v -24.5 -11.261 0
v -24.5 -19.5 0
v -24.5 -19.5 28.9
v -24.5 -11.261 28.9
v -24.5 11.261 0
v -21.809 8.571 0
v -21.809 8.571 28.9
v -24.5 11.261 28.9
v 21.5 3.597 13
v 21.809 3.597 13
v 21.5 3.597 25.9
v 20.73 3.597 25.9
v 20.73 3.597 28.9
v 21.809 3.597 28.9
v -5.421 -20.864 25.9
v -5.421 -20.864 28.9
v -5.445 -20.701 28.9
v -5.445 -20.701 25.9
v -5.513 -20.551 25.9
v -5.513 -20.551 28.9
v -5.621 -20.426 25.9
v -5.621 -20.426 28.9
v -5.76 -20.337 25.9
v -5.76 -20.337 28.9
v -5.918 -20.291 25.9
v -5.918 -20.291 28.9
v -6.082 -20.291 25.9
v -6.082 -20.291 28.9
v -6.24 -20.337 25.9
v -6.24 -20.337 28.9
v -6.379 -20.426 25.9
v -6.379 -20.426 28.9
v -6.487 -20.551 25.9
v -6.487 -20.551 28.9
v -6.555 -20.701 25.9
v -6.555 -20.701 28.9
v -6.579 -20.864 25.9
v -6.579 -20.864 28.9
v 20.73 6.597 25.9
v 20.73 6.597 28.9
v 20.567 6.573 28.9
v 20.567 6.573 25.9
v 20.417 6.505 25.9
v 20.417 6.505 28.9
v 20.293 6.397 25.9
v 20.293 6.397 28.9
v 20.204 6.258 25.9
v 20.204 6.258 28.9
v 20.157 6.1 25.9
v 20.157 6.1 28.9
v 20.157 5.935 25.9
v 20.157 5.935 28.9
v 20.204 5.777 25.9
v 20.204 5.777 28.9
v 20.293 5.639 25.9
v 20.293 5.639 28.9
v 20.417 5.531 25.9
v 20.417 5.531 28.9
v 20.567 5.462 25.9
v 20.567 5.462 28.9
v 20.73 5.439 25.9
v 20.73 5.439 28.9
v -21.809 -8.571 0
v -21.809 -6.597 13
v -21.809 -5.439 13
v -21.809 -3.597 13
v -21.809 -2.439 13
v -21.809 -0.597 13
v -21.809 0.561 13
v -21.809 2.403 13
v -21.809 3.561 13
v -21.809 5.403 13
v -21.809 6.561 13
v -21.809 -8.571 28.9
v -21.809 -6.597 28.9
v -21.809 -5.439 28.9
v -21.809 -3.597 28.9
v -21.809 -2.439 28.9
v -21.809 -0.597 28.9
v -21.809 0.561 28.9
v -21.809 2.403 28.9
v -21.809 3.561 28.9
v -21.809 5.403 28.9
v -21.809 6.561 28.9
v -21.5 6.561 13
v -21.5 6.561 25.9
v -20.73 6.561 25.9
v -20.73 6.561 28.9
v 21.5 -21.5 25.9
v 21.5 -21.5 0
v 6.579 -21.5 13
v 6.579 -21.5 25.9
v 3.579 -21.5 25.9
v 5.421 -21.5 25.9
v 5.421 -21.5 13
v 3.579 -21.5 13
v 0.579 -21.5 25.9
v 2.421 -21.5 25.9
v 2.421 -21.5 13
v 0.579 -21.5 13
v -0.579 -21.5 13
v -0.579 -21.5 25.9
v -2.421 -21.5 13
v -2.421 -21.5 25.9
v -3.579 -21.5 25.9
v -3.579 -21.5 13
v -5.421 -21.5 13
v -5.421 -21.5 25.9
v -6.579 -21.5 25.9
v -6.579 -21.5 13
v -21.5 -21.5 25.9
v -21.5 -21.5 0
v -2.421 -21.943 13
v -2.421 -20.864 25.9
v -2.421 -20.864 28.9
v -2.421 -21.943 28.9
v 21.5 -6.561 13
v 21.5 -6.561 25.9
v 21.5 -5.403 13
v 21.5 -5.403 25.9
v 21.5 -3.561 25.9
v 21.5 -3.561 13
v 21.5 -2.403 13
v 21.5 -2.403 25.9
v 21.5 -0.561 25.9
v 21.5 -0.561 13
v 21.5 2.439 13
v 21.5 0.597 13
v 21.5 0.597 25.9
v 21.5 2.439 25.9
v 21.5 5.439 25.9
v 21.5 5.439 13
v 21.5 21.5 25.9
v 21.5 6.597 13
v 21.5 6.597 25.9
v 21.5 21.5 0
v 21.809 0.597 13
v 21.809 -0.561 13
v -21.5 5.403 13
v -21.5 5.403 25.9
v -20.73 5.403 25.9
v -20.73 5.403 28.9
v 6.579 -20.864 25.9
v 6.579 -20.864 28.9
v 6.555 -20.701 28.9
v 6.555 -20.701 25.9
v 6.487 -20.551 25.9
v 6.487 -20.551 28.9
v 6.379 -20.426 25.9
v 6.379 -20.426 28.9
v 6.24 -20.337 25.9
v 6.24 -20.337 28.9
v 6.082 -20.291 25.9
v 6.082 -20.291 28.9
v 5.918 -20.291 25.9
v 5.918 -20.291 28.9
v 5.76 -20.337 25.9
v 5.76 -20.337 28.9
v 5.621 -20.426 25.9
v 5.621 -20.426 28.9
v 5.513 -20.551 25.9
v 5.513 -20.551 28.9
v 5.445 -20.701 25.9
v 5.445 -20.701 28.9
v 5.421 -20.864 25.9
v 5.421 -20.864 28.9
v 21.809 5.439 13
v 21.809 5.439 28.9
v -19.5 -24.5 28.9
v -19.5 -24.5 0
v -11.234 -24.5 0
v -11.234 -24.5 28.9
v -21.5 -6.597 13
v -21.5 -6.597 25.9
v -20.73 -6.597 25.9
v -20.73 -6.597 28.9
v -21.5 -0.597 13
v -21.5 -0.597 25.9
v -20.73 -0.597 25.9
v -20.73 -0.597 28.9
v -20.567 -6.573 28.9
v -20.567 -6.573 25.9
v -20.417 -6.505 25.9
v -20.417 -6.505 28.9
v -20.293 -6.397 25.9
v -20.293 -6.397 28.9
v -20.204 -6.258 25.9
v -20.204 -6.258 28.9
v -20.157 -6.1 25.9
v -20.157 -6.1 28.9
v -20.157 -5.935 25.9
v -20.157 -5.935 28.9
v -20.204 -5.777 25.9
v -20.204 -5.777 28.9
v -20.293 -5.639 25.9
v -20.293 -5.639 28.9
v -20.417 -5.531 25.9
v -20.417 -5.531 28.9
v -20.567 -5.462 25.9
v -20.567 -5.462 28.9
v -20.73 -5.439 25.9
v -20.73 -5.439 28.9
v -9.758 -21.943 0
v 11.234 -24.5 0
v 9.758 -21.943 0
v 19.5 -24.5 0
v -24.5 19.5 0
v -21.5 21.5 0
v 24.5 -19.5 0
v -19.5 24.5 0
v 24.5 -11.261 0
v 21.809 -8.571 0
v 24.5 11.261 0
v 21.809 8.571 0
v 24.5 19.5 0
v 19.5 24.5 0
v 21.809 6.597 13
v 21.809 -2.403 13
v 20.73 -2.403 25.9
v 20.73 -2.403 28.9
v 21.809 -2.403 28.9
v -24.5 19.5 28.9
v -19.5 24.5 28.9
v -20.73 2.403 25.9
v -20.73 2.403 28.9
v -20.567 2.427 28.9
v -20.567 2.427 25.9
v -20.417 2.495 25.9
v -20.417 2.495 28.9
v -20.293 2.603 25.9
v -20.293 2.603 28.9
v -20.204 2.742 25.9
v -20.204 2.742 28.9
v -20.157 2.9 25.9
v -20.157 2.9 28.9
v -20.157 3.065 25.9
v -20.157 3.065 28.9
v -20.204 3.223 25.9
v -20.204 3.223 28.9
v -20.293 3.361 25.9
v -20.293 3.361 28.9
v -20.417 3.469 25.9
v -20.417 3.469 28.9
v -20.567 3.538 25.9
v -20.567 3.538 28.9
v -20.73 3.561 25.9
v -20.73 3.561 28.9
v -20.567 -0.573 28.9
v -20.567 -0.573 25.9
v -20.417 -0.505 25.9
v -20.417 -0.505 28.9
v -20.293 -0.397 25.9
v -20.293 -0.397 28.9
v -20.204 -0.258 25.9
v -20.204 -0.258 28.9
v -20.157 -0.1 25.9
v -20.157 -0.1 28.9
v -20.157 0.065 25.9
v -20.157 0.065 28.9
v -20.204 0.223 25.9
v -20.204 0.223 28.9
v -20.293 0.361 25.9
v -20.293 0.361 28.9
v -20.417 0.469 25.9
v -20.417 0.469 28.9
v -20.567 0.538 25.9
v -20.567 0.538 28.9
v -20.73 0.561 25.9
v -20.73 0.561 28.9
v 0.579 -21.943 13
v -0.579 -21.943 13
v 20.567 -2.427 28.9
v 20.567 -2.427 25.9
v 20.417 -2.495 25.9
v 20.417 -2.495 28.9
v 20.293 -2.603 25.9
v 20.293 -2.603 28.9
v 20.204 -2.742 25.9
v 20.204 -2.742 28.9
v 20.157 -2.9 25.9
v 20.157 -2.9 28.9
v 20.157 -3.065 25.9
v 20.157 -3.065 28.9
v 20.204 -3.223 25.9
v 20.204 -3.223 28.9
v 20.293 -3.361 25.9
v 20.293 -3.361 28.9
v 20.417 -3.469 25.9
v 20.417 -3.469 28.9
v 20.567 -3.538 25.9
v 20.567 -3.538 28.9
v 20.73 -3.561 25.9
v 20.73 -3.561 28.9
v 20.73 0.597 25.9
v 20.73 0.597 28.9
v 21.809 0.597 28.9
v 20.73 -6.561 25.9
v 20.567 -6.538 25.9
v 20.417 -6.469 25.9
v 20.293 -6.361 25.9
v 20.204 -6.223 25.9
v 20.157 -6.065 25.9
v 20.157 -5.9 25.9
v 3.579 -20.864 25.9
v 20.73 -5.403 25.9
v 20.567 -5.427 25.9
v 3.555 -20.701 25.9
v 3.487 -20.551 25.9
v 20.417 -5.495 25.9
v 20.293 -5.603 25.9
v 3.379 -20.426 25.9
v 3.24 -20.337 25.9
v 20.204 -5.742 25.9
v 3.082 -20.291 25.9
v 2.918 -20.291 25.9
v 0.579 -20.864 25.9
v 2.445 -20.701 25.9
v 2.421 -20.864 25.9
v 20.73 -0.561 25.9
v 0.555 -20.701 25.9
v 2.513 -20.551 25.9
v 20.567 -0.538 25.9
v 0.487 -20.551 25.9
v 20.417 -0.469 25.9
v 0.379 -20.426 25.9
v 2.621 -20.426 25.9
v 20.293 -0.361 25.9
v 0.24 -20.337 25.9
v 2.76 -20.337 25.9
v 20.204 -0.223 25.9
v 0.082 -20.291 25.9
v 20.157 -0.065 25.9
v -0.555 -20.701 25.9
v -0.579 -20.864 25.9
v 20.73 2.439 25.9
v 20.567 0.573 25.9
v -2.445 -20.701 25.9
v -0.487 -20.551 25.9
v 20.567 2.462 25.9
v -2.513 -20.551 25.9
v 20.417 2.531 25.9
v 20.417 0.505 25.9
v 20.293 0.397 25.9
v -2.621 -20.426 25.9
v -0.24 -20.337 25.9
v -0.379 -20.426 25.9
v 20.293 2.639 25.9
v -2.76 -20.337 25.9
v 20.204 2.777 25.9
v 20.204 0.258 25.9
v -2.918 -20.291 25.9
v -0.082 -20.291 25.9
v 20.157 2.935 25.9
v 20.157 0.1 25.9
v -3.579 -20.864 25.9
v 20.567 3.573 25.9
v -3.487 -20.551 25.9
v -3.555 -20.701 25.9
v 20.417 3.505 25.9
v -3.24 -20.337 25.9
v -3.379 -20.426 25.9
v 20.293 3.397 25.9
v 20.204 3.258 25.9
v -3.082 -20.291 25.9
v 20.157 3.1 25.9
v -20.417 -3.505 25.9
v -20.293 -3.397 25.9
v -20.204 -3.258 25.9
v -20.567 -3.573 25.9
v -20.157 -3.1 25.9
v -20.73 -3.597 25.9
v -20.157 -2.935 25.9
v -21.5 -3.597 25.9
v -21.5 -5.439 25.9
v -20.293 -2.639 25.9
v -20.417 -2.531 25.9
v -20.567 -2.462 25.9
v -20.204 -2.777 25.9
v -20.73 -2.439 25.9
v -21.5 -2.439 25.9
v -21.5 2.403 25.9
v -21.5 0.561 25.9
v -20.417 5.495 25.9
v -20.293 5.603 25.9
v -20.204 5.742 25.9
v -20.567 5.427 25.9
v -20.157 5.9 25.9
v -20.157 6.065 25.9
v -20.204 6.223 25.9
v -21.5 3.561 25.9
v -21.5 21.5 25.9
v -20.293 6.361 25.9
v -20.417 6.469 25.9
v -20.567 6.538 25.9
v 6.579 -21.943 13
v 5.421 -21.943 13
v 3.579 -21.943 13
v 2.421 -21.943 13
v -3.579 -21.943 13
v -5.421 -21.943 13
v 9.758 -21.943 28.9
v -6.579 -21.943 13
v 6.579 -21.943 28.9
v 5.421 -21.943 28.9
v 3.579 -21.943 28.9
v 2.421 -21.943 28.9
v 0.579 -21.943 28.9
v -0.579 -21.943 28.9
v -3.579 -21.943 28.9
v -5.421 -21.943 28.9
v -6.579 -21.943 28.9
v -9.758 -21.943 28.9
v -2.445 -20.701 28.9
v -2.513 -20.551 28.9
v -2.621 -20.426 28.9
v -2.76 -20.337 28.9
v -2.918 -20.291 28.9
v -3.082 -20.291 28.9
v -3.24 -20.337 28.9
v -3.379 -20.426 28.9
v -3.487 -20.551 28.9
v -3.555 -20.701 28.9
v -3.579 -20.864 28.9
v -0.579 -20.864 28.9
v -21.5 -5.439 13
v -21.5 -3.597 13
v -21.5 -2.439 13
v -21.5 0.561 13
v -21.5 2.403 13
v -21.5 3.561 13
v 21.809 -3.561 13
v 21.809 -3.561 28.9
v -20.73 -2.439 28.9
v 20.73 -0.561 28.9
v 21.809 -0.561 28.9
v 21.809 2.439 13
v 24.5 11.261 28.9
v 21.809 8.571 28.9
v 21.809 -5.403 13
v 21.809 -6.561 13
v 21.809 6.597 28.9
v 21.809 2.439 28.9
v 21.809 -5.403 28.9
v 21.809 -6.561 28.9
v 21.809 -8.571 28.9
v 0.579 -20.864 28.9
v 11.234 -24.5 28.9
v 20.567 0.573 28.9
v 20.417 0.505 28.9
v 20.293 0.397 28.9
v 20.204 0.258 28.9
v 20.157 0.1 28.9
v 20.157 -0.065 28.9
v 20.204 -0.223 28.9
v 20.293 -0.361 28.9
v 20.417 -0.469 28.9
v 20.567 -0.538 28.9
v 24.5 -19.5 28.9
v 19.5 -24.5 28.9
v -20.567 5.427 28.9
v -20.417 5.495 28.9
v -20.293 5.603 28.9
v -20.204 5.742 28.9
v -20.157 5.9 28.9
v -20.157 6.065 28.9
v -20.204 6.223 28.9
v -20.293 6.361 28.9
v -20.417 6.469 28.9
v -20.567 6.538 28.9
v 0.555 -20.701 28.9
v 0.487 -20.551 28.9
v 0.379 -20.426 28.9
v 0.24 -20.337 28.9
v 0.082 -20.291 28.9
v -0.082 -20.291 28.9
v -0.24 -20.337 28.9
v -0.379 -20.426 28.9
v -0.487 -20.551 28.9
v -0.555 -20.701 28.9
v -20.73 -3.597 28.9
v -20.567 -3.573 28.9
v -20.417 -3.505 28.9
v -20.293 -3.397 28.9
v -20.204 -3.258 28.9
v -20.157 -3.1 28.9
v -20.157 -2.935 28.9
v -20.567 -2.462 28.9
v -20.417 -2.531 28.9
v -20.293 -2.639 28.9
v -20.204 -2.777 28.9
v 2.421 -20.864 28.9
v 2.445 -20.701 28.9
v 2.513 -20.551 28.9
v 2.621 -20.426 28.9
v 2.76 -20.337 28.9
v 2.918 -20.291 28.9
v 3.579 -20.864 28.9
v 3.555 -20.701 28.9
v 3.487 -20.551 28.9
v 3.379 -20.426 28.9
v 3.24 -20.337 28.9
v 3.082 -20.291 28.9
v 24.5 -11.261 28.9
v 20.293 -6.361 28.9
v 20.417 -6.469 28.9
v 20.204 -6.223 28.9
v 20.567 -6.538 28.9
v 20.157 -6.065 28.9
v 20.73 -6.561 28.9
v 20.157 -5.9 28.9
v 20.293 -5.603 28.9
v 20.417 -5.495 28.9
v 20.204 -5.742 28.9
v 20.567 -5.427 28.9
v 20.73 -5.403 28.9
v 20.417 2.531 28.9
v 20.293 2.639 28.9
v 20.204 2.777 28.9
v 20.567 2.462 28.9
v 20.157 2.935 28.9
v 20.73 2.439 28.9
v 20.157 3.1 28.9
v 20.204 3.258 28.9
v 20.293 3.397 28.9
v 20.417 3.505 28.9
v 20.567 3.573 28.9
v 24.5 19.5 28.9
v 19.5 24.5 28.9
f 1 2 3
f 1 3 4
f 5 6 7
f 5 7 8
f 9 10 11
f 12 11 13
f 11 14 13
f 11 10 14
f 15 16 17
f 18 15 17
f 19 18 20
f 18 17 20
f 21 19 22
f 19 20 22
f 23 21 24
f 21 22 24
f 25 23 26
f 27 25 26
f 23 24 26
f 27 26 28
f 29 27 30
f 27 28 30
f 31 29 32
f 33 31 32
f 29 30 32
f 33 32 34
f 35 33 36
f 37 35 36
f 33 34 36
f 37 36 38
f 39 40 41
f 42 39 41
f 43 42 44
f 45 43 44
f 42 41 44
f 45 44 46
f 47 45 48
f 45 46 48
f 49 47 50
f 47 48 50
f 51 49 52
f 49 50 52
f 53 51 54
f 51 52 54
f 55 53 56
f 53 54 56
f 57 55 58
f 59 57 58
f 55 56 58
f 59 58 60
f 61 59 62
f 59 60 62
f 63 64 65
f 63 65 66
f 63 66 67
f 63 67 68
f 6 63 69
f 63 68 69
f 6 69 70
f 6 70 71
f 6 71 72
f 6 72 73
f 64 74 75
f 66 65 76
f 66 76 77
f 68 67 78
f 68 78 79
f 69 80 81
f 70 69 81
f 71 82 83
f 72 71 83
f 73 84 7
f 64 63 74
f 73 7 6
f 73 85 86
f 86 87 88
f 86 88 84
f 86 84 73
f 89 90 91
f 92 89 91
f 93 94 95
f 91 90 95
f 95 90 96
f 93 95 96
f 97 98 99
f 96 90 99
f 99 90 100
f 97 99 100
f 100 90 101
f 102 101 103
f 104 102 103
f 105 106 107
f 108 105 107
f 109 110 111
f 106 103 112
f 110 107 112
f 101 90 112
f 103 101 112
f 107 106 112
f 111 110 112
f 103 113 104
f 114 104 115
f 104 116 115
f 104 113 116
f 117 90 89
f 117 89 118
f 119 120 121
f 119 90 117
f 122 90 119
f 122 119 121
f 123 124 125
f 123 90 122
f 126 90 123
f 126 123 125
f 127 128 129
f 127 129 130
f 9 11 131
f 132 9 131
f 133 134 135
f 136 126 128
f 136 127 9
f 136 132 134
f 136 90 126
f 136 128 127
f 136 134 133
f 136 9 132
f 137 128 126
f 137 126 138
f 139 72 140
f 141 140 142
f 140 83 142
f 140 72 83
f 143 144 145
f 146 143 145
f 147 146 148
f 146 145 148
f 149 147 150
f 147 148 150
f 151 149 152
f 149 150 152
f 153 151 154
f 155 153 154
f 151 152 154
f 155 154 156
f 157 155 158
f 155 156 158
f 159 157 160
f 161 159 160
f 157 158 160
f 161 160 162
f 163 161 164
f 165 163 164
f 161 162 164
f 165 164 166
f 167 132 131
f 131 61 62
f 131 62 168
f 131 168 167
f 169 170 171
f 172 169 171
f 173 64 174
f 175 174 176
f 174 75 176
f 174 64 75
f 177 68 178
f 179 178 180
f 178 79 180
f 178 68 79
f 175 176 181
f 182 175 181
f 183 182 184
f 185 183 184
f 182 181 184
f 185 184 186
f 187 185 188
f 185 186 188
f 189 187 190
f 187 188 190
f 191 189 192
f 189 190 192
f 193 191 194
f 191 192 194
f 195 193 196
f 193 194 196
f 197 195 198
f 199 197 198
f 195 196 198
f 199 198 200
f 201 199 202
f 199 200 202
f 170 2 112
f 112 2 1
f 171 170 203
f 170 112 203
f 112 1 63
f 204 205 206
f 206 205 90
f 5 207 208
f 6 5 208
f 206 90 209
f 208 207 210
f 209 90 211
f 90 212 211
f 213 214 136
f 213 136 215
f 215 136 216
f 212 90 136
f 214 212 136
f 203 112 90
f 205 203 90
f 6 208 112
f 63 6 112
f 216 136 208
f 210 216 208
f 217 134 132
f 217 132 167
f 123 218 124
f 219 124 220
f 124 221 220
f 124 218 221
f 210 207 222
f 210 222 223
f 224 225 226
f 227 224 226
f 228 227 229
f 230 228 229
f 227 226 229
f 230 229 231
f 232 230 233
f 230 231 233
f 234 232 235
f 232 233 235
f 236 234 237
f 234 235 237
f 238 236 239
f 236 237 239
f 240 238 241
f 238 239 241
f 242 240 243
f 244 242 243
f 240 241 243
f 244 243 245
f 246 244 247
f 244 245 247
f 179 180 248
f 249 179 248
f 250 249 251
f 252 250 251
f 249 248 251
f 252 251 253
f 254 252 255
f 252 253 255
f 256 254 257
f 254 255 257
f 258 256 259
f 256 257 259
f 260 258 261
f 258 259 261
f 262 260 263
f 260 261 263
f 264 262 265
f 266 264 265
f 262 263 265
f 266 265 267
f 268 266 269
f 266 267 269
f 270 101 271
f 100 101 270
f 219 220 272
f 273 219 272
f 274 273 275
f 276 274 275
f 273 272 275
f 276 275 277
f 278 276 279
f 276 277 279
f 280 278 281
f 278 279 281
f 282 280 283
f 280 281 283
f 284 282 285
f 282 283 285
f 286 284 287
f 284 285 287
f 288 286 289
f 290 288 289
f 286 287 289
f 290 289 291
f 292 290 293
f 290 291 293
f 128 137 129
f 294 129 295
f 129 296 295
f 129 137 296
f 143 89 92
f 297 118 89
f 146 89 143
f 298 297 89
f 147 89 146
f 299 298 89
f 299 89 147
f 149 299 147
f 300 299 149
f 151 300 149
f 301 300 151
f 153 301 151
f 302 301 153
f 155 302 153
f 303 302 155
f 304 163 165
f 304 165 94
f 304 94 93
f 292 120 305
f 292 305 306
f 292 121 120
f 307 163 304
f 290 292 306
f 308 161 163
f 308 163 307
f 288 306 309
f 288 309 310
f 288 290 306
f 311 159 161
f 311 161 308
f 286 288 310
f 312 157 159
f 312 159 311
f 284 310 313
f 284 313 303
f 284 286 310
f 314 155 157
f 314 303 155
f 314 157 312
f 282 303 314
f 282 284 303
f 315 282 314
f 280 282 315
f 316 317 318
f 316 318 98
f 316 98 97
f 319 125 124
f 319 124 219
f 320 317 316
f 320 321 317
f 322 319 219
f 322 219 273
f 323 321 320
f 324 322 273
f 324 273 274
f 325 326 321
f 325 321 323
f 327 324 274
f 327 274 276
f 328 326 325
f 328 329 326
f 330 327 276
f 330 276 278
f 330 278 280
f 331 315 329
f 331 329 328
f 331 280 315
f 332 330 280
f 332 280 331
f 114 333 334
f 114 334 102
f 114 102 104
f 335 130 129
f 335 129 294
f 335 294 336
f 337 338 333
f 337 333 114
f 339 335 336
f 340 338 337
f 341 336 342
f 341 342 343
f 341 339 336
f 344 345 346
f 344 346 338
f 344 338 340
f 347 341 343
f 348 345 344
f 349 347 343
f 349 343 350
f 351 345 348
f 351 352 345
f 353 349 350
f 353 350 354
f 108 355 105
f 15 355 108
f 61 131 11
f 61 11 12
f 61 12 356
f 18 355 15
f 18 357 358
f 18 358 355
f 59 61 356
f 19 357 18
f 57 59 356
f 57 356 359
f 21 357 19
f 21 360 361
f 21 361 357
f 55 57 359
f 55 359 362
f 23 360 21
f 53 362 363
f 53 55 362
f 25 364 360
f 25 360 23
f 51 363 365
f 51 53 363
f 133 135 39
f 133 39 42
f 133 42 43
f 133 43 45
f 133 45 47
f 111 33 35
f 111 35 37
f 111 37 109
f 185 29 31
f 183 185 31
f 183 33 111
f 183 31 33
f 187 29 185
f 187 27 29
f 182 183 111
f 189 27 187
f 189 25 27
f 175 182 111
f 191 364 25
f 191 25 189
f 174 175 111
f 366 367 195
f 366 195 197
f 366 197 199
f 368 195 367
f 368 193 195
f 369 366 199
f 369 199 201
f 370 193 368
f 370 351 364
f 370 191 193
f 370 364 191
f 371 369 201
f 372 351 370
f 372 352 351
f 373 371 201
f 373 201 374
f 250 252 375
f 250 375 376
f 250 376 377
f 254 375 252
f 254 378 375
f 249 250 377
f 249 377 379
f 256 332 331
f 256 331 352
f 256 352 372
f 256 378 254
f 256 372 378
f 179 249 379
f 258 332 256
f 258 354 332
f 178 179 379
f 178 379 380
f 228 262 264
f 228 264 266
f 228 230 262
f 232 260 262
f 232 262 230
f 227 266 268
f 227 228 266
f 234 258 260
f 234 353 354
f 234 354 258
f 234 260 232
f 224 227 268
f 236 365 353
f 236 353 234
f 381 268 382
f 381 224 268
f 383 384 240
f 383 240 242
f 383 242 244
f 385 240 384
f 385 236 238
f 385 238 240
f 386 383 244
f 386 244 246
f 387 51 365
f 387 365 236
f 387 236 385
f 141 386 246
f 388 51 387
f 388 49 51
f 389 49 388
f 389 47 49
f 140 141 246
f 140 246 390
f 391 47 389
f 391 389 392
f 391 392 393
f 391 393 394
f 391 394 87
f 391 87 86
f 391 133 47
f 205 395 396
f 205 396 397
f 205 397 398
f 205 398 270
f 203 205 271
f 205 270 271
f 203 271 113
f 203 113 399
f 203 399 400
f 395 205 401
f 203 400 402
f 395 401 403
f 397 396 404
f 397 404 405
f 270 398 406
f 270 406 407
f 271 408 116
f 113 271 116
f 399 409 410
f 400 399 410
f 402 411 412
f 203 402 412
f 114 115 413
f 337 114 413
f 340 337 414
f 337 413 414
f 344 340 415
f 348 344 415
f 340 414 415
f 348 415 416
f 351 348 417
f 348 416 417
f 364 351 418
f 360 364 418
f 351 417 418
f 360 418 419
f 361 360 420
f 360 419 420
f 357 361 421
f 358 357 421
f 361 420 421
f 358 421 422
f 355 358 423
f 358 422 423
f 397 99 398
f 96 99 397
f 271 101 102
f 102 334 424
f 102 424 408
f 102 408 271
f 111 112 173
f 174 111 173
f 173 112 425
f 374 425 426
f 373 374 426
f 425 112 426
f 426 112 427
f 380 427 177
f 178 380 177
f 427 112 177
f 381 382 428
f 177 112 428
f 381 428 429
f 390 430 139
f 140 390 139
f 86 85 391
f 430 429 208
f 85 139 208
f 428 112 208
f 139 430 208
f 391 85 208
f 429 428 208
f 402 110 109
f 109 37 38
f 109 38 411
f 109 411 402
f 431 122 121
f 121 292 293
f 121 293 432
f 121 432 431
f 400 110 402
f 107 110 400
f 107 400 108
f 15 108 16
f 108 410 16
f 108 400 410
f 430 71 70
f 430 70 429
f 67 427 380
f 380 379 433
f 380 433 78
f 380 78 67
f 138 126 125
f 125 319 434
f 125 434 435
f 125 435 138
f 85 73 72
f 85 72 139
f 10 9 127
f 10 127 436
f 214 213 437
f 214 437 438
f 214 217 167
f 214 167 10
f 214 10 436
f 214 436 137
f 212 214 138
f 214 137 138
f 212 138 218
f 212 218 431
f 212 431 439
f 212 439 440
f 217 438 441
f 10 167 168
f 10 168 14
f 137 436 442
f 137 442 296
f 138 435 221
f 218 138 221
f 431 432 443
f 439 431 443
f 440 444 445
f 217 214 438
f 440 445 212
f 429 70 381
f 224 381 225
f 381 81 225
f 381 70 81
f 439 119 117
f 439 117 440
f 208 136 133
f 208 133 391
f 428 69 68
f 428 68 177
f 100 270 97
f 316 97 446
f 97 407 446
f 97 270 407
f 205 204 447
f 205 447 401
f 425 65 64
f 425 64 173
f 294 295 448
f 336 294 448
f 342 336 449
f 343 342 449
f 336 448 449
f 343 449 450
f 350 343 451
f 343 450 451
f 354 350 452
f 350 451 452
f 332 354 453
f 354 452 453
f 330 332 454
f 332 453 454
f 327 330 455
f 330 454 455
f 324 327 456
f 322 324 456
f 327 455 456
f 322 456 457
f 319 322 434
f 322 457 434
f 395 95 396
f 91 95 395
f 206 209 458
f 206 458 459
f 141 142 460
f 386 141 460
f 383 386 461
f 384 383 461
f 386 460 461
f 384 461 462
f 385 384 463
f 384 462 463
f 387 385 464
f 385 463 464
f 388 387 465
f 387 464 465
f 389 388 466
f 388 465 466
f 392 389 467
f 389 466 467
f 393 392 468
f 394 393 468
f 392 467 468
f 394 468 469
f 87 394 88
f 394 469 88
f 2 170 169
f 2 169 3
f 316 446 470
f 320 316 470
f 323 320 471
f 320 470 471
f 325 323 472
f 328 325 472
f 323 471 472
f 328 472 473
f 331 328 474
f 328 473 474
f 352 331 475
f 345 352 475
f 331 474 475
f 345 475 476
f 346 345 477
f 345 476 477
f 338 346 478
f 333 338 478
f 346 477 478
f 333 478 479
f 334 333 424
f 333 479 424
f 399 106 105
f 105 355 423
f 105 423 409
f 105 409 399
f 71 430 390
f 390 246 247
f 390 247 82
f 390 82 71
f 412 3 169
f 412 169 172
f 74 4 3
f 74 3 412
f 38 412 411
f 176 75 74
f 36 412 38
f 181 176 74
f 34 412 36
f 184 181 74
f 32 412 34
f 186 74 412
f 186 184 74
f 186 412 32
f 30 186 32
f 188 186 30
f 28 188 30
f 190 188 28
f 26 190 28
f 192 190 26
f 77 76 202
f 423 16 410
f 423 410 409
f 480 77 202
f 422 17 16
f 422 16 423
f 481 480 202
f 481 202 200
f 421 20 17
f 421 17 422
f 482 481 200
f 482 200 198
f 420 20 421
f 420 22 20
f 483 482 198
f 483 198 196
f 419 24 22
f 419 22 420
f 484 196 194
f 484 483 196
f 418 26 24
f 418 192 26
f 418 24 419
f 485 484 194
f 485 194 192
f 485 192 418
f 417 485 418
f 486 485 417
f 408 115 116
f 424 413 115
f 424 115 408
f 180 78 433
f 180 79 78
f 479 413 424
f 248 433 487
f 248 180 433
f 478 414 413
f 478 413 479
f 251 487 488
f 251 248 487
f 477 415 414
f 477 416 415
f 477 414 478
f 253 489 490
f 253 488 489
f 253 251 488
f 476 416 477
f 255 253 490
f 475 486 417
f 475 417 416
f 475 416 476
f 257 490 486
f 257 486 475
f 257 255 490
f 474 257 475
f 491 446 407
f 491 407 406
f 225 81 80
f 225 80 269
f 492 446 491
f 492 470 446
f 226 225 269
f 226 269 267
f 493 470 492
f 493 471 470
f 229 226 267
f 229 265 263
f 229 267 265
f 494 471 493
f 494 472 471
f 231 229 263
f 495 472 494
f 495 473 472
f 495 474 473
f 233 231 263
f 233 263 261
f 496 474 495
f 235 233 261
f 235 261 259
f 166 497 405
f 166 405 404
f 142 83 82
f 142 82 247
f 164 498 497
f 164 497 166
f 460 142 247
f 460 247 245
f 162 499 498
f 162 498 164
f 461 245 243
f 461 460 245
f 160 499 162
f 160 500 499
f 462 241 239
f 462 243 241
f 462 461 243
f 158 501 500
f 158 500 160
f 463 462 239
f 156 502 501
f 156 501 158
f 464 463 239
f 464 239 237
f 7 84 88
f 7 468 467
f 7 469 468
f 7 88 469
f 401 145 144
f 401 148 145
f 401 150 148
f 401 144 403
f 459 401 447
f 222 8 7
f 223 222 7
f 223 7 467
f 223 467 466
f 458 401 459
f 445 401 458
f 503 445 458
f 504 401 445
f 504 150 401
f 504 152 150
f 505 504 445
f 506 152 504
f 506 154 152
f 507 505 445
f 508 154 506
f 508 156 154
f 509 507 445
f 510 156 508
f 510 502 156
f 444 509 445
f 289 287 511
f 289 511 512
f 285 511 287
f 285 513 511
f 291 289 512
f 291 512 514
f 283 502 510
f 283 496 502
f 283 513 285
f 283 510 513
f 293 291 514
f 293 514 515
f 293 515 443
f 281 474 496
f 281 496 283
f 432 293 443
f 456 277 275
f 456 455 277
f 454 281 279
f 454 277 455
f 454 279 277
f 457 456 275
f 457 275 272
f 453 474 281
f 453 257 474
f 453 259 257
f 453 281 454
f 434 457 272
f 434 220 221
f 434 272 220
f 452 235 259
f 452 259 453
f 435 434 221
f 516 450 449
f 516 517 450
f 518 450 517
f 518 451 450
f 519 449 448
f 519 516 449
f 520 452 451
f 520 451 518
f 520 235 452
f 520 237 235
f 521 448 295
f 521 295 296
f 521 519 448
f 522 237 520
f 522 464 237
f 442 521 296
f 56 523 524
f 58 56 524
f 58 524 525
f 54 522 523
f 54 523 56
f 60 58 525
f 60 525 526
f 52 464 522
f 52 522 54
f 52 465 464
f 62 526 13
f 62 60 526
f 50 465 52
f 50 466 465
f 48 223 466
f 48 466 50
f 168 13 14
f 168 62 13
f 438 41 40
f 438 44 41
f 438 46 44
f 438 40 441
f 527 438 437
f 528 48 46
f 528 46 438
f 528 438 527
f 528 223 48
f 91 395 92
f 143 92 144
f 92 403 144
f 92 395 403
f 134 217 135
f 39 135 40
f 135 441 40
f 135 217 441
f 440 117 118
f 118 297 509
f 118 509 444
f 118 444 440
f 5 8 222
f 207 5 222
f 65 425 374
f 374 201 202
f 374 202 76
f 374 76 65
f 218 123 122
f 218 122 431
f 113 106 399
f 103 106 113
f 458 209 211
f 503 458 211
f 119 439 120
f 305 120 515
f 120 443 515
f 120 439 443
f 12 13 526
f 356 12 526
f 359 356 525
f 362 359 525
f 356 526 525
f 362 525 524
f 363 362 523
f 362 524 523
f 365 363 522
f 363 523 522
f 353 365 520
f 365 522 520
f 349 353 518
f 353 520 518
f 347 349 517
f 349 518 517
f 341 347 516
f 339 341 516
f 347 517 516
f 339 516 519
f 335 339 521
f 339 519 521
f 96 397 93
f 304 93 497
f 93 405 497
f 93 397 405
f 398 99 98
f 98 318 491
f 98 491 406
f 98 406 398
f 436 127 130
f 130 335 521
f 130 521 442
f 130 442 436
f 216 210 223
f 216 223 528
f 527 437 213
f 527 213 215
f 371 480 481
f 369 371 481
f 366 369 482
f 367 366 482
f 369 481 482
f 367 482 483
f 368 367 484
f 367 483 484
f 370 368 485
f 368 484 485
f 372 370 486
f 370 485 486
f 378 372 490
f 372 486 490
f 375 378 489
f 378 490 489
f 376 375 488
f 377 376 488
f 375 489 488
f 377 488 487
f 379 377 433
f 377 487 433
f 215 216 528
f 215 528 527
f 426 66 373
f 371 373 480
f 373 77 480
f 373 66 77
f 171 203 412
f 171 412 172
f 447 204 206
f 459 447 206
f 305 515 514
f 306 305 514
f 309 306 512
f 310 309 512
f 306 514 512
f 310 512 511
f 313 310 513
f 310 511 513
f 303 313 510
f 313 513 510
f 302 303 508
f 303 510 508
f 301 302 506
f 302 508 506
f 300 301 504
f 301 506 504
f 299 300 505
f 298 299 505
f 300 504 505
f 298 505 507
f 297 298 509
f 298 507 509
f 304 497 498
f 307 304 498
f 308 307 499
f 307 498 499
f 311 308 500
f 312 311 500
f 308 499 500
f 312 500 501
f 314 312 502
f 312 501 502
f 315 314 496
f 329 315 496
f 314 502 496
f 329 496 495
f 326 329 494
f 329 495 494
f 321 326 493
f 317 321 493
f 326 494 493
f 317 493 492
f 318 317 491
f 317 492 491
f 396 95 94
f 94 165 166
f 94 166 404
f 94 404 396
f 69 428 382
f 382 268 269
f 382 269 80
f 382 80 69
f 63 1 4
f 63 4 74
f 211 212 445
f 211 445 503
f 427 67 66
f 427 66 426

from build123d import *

# Parameters (mm, degrees)
SKETCH1_W           = 49
SKETCH1_H           = 49
BOSS_EXTRUDE1_DEPTH = 28.9
SKETCH2_W           = 43
SKETCH2_H           = 43
CUT_EXTRUDE1_DEPTH  = 25.9
CUT_EXTRUDE2_DEPTH  = 46.11884307
CUT_EXTRUDE3_DEPTH  = 15.9


with BuildPart() as part:
    # Sketch1 → Boss-Extrude1 (new body)
    with BuildSketch(Plane.XY):
        Rectangle(SKETCH1_W, SKETCH1_H)
    extrude(amount=BOSS_EXTRUDE1_DEPTH)

    # Sketch2 → Cut-Extrude1 (cut)
    with BuildSketch(Plane(origin=(0, 0, 0), x_dir=(-1, 0, 0), z_dir=(0, 0, -1))):
        Rectangle(SKETCH2_W, SKETCH2_H)
    extrude(amount=-CUT_EXTRUDE1_DEPTH, mode=Mode.SUBTRACT)

    # Sketch3 → Cut-Extrude2 (cut, through all)
    with BuildSketch(Plane.XY.offset(28.9)):
        Polygon((-21.809403406, 8.570892497), (-24.5, 11.26148909), (-24.5, -11.26148909), (-21.809403406, -8.570892497), align=None)
        Polygon((-19.5, -24.5), (-24.5, -19.5), (-24.5, -24.5), align=None)
        Polygon((-9.757939822, -21.943201951), (-11.234107864, -24.5), (11.234107864, -24.5), (9.757939822, -21.943201951), align=None)
        Polygon((24.5, -24.5), (24.5, -19.5), (19.5, -24.5), align=None)
        Polygon((24.5, -11.26148909), (24.5, 11.26148909), (21.809403406, 8.570892497), (21.809403406, -8.570892497), align=None)
        Polygon((-24.5, 19.5), (-19.5, 24.5), (-24.5, 24.5), align=None)
        Polygon((24.5, 24.5), (19.5, 24.5), (24.5, 19.5), align=None)
    extrude(amount=-CUT_EXTRUDE2_DEPTH, mode=Mode.SUBTRACT)

    # Sketch4 → Cut-Extrude3 (cut)
    with BuildSketch(Plane.XY.offset(28.9)):
        with BuildLine():
            Line((-21.809403406, -6.596640664), (-20.73011061, -6.596640664))
            ThreePointArc((-20.73011061, -6.596640664), (-20.151207618, -6.017737672), (-20.73011061, -5.43883468))
            Line((-20.73011061, -5.43883468), (-21.809403406, -5.43883468))
            ThreePointArc((-21.809403406, -5.43883468), (-22.388306399, -6.017737672), (-21.809403406, -6.596640664))
        make_face()
        with BuildLine():
            Line((-21.809403406, -3.596640664), (-20.73011061, -3.596640664))
            ThreePointArc((-20.73011061, -3.596640664), (-20.151207618, -3.017737672), (-20.73011061, -2.43883468))
            Line((-20.73011061, -2.43883468), (-21.809403406, -2.43883468))
            ThreePointArc((-21.809403406, -2.43883468), (-22.388306399, -3.017737672), (-21.809403406, -3.596640664))
        make_face()
        with BuildLine():
            Line((-21.809403406, -0.596640664), (-20.73011061, -0.596640664))
            ThreePointArc((-20.73011061, -0.596640664), (-20.151207618, -0.017737672), (-20.73011061, 0.56116532))
            Line((-20.73011061, 0.56116532), (-21.809403406, 0.56116532))
            ThreePointArc((-21.809403406, 0.56116532), (-22.388306399, -0.017737672), (-21.809403406, -0.596640664))
        make_face()
        with BuildLine():
            Line((-21.809403406, 2.403359336), (-20.73011061, 2.403359336))
            ThreePointArc((-20.73011061, 2.403359336), (-20.151207618, 2.982262328), (-20.73011061, 3.56116532))
            Line((-20.73011061, 3.56116532), (-21.809403406, 3.56116532))
            ThreePointArc((-21.809403406, 3.56116532), (-22.388306399, 2.982262328), (-21.809403406, 2.403359336))
        make_face()
        with BuildLine():
            Line((-21.809403406, 5.403359336), (-20.73011061, 5.403359336))
            ThreePointArc((-20.73011061, 5.403359336), (-20.151207618, 5.982262328), (-20.73011061, 6.56116532))
            Line((-20.73011061, 6.56116532), (-21.809403406, 6.56116532))
            ThreePointArc((-21.809403406, 6.56116532), (-22.388306399, 5.982262328), (-21.809403406, 5.403359336))
        make_face()
        with BuildLine():
            Line((21.809403406, -5.403359336), (20.73011061, -5.403359336))
            ThreePointArc((20.73011061, -5.403359336), (20.151207618, -5.982262328), (20.73011061, -6.56116532))
            Line((20.73011061, -6.56116532), (21.809403406, -6.56116532))
            ThreePointArc((21.809403406, -6.56116532), (22.388306399, -5.982262328), (21.809403406, -5.403359336))
        make_face()
        with BuildLine():
            Line((21.809403406, -2.403359336), (20.73011061, -2.403359336))
            ThreePointArc((20.73011061, -2.403359336), (20.151207618, -2.982262328), (20.73011061, -3.56116532))
            Line((20.73011061, -3.56116532), (21.809403406, -3.56116532))
            ThreePointArc((21.809403406, -3.56116532), (22.388306399, -2.982262328), (21.809403406, -2.403359336))
        make_face()
        with BuildLine():
            Line((21.809403406, 0.596640664), (20.73011061, 0.596640664))
            ThreePointArc((20.73011061, 0.596640664), (20.151207618, 0.017737672), (20.73011061, -0.56116532))
            Line((20.73011061, -0.56116532), (21.809403406, -0.56116532))
            ThreePointArc((21.809403406, -0.56116532), (22.388306399, 0.017737672), (21.809403406, 0.596640664))
        make_face()
        with BuildLine():
            Line((21.809403406, 3.596640664), (20.73011061, 3.596640664))
            ThreePointArc((20.73011061, 3.596640664), (20.151207618, 3.017737672), (20.73011061, 2.43883468))
            Line((20.73011061, 2.43883468), (21.809403406, 2.43883468))
            ThreePointArc((21.809403406, 2.43883468), (22.388306399, 3.017737672), (21.809403406, 3.596640664))
        make_face()
        with BuildLine():
            Line((21.809403406, 6.596640664), (20.73011061, 6.596640664))
            ThreePointArc((20.73011061, 6.596640664), (20.151207618, 6.017737672), (20.73011061, 5.43883468))
            Line((20.73011061, 5.43883468), (21.809403406, 5.43883468))
            ThreePointArc((21.809403406, 5.43883468), (22.388306399, 6.017737672), (21.809403406, 6.596640664))
        make_face()
        with BuildLine():
            Line((5.421097008, -20.863909155), (5.421097008, -21.943201951))
            ThreePointArc((5.421097008, -21.943201951), (6, -22.522104943), (6.578902992, -21.943201951))
            Line((6.578902992, -21.943201951), (6.578902992, -20.863909155))
            ThreePointArc((6.578902992, -20.863909155), (6, -20.285006162), (5.421097008, -20.863909155))
        make_face()
        with BuildLine():
            Line((2.421097008, -20.863909155), (2.421097008, -21.943201951))
            ThreePointArc((2.421097008, -21.943201951), (3, -22.522104943), (3.578902992, -21.943201951))
            Line((3.578902992, -21.943201951), (3.578902992, -20.863909155))
            ThreePointArc((3.578902992, -20.863909155), (3, -20.285006162), (2.421097008, -20.863909155))
        make_face()
        with BuildLine():
            Line((-0.578902992, -20.863909155), (-0.578902992, -21.943201951))
            ThreePointArc((-0.578902992, -21.943201951), (0, -22.522104943), (0.578902992, -21.943201951))
            Line((0.578902992, -21.943201951), (0.578902992, -20.863909155))
            ThreePointArc((0.578902992, -20.863909155), (0, -20.285006162), (-0.578902992, -20.863909155))
        make_face()
        with BuildLine():
            Line((-3.578902992, -20.863909155), (-3.578902992, -21.943201951))
            ThreePointArc((-3.578902992, -21.943201951), (-3, -22.522104943), (-2.421097008, -21.943201951))
            Line((-2.421097008, -21.943201951), (-2.421097008, -20.863909155))
            ThreePointArc((-2.421097008, -20.863909155), (-3, -20.285006162), (-3.578902992, -20.863909155))
        make_face()
        with BuildLine():
            Line((-6.578902992, -20.863909155), (-6.578902992, -21.943201951))
            ThreePointArc((-6.578902992, -21.943201951), (-6, -22.522104943), (-5.421097008, -21.943201951))
            Line((-5.421097008, -21.943201951), (-5.421097008, -20.863909155))
            ThreePointArc((-5.421097008, -20.863909155), (-6, -20.285006162), (-6.578902992, -20.863909155))
        make_face()
    extrude(amount=-CUT_EXTRUDE3_DEPTH, mode=Mode.SUBTRACT)


solid = part.part
